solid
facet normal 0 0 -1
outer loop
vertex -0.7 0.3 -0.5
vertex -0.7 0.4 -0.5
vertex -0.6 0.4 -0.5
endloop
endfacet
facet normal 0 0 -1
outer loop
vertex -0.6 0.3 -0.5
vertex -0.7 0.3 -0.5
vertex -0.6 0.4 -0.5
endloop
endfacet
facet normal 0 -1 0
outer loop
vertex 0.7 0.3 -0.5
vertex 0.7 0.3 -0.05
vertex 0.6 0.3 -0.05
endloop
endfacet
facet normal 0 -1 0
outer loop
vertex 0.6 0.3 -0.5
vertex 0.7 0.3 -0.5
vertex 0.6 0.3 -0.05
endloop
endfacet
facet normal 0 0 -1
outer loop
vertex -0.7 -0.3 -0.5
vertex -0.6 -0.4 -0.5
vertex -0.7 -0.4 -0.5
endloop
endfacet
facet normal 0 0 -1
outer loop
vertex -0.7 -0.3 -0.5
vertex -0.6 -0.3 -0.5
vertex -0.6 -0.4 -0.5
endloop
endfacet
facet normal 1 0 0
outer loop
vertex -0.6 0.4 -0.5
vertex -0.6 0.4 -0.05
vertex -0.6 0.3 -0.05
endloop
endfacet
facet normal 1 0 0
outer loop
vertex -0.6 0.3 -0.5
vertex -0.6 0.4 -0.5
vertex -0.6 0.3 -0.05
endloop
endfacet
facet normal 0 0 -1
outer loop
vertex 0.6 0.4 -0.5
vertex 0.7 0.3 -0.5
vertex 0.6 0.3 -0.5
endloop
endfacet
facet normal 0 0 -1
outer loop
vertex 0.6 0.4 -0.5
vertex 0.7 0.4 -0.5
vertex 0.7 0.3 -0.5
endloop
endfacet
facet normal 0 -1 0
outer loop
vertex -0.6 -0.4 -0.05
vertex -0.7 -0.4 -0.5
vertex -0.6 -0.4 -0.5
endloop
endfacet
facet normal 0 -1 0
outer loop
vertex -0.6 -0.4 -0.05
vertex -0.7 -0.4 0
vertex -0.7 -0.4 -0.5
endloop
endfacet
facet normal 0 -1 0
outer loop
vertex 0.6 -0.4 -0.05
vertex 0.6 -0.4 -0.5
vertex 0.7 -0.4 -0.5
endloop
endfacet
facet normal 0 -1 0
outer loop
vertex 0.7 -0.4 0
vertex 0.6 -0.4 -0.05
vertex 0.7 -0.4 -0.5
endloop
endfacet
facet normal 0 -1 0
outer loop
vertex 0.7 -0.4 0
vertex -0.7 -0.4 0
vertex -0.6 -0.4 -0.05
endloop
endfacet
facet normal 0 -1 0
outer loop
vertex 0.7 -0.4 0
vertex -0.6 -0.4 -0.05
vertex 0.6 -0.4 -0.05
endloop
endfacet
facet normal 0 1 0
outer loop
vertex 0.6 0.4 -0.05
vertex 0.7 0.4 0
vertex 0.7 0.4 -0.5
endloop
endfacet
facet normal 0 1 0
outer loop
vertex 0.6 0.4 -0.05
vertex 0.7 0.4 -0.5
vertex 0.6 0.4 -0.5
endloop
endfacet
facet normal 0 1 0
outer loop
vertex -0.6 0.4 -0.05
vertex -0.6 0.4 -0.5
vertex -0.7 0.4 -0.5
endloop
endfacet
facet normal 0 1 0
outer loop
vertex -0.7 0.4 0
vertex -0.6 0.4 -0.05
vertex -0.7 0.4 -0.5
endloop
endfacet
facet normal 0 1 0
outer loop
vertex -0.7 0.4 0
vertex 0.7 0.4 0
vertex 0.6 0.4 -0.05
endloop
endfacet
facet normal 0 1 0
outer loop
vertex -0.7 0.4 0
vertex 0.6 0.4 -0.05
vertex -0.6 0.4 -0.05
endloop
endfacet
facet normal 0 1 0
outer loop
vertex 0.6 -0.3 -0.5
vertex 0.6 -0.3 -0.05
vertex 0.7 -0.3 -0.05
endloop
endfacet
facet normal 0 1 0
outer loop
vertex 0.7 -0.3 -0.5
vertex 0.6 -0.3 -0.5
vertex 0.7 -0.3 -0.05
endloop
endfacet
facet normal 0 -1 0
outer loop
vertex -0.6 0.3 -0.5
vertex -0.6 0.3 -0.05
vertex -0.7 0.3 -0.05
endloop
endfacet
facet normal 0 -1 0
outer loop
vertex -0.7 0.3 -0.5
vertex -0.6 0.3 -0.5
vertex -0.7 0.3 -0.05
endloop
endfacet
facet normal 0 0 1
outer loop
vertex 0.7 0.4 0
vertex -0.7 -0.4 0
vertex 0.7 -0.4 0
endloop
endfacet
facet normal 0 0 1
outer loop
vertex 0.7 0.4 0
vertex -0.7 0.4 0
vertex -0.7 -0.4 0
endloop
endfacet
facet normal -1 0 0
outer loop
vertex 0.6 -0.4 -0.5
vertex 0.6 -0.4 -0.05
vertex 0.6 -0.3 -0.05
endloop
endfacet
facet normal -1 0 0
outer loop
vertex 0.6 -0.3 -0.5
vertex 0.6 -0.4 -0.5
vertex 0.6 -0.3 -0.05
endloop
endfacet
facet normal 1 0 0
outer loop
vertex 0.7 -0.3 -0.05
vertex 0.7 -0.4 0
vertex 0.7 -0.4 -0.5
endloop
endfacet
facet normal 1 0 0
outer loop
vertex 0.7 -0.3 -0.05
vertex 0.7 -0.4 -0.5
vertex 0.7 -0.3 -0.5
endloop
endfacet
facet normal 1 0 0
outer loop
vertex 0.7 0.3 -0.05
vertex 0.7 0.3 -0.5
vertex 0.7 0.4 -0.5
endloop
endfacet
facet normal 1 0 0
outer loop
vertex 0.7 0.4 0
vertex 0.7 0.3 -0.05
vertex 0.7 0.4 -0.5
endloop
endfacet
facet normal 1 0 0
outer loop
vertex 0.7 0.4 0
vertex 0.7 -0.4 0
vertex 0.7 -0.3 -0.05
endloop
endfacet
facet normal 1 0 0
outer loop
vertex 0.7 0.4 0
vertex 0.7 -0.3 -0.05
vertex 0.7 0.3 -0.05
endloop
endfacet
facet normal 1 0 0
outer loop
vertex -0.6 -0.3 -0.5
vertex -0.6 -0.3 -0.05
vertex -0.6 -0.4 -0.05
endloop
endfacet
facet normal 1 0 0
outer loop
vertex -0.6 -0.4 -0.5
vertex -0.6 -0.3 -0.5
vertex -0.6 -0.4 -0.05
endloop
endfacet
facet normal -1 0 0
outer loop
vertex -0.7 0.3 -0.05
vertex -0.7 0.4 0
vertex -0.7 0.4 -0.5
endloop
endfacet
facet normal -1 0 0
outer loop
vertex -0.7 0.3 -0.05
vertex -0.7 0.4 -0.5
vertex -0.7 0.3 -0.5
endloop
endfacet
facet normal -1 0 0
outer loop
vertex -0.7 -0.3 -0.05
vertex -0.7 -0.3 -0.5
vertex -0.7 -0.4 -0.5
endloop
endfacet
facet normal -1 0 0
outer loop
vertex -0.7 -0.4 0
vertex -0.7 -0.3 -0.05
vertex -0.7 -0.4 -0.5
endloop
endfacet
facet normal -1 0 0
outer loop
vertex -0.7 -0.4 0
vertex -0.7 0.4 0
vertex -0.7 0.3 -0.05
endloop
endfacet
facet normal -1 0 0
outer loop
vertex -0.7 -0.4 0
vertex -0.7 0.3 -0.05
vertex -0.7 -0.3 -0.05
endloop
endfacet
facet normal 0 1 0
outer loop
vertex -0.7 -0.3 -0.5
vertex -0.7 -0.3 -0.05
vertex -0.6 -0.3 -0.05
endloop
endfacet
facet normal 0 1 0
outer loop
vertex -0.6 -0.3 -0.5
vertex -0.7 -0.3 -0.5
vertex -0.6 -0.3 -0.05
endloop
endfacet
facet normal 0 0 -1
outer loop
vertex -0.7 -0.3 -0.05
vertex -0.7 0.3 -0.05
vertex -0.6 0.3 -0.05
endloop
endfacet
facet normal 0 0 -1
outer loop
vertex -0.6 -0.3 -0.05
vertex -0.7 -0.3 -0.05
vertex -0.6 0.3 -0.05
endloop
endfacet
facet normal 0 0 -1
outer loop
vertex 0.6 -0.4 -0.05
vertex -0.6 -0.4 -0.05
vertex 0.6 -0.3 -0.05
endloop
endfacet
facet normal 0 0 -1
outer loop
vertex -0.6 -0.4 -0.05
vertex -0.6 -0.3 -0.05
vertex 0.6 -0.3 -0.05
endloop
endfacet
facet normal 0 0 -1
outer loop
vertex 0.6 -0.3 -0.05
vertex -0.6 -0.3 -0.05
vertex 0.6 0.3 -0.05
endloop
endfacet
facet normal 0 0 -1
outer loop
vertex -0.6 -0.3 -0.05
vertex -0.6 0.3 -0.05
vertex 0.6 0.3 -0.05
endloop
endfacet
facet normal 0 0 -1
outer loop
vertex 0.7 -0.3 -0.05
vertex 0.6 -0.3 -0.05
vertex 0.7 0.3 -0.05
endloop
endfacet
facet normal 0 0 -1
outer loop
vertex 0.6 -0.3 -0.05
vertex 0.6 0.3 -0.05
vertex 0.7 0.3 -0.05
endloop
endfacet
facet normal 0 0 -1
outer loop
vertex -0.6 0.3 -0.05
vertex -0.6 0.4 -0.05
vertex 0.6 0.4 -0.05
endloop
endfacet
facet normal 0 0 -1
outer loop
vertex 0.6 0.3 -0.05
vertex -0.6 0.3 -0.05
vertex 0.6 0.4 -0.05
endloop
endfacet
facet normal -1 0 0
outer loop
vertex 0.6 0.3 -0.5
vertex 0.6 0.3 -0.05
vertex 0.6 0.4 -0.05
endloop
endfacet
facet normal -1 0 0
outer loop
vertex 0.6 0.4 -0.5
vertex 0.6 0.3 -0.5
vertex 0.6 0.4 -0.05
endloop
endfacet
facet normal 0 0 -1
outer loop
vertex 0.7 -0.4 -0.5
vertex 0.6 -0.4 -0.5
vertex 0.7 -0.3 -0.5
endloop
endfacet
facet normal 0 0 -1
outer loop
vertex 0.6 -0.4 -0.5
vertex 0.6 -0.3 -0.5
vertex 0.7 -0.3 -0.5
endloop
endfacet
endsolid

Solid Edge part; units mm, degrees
sketch "Sketch1" plane through (0, 0, 0) normal (0, 0, 1) x (1, 0, 0)
  line L0 (-0.7, -0.4) -> (0.7, -0.4)
  line L1 (0.7, -0.4) -> (0.7, 0.4)
  line L2 (0.7, 0.4) -> (-0.7, 0.4)
  line L3 (-0.7, 0.4) -> (-0.7, -0.4)
  dimension "D1" = 1.4
  dimension "D2" = 0.8
extrude "Protrusion1" add sketch "Sketch1" against normal blind 0.05
sketch "Sketch2" plane through (0, 0, -0.05) normal (0, 0, -1) x (1, 0, 0)
  line L0 (-0.7, -0.4) -> (-0.7, -0.3)
  line L1 (-0.6, -0.3) -> (-0.7, -0.3)
  line L2 (-0.6, -0.4) -> (-0.6, -0.3)
  line L3 (-0.6, -0.4) -> (-0.7, -0.4)
  line L4 (-0.6, 0.3) -> (-0.6, 0.4)
  line L5 (-0.7, 0.4) -> (-0.6, 0.4)
  line L6 (-0.7, 0.3) -> (-0.7, 0.4)
  line L7 (-0.7, 0.3) -> (-0.6, 0.3)
  line L8 (0.6, -0.3) -> (0.6, -0.4)
  line L9 (0.7, -0.4) -> (0.6, -0.4)
  line L10 (0.7, -0.3) -> (0.7, -0.4)
  line L11 (0.7, -0.3) -> (0.6, -0.3)
  line L12 (0.6, 0.4) -> (0.7, 0.4)
  line L13 (0.7, 0.4) -> (0.7, 0.3)
  line L14 (0.6, 0.3) -> (0.7, 0.3)
  line L15 (0.6, 0.4) -> (0.6, 0.3)
extrude "Ausprägung_2" add sketch "Sketch2" along normal blind 0.45
